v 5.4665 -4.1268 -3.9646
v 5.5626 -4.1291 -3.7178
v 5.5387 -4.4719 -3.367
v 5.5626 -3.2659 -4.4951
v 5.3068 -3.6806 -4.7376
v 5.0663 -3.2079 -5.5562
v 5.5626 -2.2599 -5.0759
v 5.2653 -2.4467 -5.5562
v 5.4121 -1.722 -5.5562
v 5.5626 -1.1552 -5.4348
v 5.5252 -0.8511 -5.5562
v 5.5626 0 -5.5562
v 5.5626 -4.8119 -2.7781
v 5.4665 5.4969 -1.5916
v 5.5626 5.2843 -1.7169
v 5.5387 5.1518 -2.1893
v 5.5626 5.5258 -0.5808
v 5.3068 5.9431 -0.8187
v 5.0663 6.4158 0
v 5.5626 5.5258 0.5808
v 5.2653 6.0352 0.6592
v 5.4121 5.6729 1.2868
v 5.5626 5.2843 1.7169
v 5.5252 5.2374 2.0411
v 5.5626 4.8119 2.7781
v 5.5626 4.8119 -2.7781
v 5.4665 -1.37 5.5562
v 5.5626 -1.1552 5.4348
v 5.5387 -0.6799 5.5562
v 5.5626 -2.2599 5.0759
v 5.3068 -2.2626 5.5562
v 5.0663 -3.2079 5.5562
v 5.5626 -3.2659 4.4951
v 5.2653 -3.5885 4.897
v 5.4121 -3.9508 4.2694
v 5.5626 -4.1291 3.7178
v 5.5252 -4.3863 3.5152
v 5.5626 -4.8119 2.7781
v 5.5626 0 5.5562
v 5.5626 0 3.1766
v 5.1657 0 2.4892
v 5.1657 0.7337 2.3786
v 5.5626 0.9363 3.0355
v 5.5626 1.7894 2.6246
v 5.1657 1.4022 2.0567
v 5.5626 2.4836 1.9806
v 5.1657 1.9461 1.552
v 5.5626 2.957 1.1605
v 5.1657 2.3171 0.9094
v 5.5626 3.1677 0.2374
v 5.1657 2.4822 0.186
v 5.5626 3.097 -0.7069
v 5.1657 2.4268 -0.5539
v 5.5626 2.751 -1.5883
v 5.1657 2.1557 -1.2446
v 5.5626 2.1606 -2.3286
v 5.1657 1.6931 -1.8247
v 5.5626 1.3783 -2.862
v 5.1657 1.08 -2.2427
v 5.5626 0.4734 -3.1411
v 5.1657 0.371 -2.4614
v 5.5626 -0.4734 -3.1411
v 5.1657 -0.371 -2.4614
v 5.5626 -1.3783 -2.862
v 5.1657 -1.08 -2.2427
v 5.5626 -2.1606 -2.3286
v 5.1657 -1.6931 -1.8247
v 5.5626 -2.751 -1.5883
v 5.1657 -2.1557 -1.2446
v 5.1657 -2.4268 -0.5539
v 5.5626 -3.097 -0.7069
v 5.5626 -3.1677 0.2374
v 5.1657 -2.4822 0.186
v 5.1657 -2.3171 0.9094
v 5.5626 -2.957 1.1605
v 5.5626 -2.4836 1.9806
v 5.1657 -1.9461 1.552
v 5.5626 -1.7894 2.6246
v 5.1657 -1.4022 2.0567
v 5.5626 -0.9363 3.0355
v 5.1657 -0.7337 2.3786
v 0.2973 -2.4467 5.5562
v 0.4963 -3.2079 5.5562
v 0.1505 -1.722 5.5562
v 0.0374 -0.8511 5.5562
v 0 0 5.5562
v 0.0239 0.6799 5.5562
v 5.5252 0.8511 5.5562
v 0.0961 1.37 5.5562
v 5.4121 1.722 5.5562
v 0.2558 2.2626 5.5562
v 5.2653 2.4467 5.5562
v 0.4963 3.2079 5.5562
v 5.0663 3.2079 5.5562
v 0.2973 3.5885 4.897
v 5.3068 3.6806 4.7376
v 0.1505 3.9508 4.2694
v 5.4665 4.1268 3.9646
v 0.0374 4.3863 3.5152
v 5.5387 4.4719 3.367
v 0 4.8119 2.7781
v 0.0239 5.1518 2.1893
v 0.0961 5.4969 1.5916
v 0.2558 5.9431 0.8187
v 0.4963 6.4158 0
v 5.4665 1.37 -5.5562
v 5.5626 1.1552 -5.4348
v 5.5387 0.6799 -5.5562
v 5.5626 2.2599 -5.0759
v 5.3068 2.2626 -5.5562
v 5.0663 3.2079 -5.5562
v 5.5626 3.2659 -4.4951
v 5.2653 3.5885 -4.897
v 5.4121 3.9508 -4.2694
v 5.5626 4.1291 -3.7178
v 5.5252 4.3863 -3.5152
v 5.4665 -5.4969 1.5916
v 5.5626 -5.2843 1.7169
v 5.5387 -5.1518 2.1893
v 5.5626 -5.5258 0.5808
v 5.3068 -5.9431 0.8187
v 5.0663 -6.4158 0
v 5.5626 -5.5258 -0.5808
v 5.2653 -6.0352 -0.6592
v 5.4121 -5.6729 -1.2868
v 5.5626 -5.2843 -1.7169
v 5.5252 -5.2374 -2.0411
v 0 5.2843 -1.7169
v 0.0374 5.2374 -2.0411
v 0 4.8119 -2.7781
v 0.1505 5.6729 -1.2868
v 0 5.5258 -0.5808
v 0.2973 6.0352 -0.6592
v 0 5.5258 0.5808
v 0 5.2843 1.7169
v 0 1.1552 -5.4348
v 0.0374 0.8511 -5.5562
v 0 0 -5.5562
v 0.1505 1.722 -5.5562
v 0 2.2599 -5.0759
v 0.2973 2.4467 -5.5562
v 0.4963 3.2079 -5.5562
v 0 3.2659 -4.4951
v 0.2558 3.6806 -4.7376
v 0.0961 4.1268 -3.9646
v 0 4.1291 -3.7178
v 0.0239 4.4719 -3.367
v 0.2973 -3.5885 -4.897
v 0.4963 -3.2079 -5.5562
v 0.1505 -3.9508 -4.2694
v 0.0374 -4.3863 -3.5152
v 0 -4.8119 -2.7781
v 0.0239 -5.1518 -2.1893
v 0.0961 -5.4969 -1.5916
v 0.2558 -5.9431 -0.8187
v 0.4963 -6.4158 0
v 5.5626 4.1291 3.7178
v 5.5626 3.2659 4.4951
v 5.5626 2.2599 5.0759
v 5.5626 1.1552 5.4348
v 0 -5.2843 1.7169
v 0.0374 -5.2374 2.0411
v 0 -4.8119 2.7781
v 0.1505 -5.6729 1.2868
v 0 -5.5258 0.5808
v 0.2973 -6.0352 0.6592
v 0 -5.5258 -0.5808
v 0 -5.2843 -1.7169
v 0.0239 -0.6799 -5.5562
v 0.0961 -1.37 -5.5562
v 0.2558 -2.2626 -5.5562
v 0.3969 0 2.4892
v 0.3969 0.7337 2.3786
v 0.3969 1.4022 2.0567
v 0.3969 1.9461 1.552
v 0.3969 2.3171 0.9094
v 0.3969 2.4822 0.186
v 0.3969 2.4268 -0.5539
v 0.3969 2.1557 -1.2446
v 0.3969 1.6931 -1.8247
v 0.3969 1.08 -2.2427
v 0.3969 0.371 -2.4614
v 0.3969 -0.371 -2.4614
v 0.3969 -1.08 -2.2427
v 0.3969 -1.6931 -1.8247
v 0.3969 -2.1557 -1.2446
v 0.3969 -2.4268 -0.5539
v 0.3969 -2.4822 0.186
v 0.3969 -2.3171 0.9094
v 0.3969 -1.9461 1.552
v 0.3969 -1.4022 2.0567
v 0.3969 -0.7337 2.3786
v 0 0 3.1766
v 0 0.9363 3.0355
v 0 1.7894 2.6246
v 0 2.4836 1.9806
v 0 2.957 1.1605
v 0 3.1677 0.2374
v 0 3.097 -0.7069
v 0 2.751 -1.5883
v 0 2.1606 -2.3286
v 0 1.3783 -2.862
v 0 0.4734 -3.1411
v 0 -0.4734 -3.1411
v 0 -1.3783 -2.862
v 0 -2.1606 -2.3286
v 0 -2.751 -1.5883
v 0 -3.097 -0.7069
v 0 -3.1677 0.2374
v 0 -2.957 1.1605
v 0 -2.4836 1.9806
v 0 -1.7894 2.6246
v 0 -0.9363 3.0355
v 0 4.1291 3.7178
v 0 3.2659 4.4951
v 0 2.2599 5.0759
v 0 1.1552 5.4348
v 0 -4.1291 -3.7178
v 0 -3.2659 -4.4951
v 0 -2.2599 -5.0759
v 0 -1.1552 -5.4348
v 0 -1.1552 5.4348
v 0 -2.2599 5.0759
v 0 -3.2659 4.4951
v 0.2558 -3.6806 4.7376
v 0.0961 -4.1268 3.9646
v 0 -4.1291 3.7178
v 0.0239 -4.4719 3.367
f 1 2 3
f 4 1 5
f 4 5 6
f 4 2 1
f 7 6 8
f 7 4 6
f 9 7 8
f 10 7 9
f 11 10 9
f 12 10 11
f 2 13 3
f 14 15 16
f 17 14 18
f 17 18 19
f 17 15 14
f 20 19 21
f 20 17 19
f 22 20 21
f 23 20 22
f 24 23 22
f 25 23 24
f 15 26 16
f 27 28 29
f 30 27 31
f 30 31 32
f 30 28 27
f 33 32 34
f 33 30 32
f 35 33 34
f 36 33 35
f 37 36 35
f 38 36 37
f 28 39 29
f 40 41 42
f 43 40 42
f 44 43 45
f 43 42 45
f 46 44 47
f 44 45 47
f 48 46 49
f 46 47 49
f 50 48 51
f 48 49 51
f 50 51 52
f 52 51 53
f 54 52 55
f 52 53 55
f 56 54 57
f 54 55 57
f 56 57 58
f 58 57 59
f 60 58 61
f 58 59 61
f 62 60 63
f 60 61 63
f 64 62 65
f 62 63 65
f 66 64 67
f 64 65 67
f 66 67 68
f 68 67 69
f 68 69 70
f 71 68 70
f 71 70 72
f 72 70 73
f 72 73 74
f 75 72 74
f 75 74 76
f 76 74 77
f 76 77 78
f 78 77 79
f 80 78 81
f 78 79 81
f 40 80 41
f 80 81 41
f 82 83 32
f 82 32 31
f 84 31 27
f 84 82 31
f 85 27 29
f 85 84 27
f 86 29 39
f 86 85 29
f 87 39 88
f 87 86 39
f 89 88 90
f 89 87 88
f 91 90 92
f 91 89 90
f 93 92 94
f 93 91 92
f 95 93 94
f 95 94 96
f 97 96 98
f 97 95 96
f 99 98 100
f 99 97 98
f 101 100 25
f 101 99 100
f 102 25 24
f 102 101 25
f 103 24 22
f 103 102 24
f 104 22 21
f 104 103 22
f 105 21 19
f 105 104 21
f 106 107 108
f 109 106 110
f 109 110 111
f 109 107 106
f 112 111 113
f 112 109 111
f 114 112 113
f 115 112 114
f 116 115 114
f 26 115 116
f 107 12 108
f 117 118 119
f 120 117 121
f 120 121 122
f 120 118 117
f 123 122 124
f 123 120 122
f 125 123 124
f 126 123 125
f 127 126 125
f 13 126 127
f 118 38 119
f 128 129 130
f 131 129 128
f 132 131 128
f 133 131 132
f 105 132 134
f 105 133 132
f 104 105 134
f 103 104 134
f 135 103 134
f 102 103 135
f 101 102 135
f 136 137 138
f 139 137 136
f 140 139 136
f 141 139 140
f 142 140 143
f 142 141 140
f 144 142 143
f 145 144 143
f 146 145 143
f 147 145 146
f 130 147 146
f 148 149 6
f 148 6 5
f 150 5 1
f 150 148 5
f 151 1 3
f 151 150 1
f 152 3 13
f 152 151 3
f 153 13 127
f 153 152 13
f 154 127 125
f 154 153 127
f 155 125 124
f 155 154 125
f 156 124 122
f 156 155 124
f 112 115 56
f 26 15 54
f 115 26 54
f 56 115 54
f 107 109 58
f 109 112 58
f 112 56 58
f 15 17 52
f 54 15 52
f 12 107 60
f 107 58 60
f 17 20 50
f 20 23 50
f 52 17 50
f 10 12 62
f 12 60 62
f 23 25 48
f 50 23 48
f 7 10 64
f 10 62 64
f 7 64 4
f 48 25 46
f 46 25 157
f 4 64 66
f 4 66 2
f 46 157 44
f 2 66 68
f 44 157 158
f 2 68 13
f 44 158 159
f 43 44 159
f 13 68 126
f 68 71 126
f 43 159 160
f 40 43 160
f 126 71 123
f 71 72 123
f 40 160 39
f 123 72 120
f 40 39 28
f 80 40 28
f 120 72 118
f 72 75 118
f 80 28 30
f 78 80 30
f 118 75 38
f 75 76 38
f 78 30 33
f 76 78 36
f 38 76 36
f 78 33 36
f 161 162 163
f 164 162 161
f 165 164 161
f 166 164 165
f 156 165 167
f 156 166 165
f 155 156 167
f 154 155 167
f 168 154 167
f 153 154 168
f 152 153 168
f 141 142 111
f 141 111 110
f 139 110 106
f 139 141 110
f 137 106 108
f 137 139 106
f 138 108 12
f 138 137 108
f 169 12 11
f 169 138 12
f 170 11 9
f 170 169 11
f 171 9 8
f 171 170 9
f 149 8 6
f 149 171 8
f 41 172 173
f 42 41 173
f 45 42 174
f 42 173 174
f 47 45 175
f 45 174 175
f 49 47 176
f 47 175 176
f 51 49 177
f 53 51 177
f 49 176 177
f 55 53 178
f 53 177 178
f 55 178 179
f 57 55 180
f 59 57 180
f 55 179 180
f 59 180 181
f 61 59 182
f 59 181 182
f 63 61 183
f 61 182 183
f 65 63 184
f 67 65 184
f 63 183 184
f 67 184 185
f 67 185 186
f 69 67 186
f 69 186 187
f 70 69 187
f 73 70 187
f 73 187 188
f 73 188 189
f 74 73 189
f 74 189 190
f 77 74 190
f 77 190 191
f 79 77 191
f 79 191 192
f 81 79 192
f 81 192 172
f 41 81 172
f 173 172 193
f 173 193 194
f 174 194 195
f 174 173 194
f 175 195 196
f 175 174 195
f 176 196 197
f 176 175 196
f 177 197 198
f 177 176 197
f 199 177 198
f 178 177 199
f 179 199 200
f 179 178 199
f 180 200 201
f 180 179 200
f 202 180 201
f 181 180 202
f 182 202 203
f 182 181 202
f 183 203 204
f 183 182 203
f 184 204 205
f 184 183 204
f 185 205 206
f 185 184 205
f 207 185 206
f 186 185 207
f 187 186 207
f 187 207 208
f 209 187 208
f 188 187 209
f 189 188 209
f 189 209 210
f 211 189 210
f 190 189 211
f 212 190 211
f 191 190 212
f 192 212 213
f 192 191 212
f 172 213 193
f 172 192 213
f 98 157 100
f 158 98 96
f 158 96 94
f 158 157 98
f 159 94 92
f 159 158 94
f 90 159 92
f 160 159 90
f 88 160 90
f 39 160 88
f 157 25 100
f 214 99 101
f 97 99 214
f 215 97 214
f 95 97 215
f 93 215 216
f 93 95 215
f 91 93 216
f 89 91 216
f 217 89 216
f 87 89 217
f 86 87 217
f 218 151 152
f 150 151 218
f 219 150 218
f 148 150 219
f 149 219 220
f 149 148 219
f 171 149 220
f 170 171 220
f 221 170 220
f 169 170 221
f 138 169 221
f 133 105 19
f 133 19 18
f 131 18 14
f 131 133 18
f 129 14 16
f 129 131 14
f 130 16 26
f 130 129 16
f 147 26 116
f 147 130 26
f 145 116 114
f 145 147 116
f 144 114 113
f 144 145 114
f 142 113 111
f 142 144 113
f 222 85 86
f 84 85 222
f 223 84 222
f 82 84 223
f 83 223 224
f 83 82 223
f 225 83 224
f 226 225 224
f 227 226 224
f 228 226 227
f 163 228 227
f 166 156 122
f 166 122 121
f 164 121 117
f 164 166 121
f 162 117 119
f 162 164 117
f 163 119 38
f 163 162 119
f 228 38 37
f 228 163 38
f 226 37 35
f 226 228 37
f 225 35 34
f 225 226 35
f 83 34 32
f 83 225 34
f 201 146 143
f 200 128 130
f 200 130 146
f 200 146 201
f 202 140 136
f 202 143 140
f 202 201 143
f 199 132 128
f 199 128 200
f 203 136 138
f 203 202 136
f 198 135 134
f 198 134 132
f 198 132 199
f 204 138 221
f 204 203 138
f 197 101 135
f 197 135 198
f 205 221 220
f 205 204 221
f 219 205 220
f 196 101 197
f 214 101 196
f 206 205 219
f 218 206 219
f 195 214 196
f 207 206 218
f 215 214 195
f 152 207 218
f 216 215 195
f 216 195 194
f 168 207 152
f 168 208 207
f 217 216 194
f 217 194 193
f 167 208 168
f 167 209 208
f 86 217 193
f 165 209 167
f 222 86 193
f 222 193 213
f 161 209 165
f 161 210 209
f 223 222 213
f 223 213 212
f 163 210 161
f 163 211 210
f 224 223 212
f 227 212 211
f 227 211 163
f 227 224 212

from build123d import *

# Parameters (mm, degrees)
BODY_DEPTH     = 5.5626
THREAD_D       = 4.9784
CHAMFER2_SIZE  = 0.687407664
CHAMFER2_SIZE2 = 0.396875
CHAMFER3_SIZE  = 0.687407664
CHAMFER3_SIZE2 = 0.396875


with BuildPart() as part:
    # Sketch1 → Body (new body)
    with BuildSketch(Plane.YZ):
        Polygon((-6.415804866, 0), (-3.207902433, 5.55625), (3.207902433, 5.55625), (6.415804866, 0), (3.207902433, -5.55625), (-3.207902433, -5.55625), align=None)
    extrude(amount=BODY_DEPTH)

    # Sketch2 → Chamfer1 (revolve, cut)
    with BuildSketch(Plane.XY):
        Polygon((0, 5.55625), (0.496264233, 6.415804866), (0, 6.415804866), align=None)
        Polygon((5.5626, 5.55625), (5.5626, 6.415804866), (5.066335767, 6.415804866), align=None)
    revolve(axis=Axis((-1.11252, 0, 0), (1, 0, 0)), mode=Mode.SUBTRACT)

    # Thread (through all)
    with Locations(Plane(origin=(5.5626, 0, 0), x_dir=(0, 0, -1), z_dir=(1, 0, 0))):
        with Locations((0, 0)):
            Hole(THREAD_D / 2)

    # Chamfer2
    chamfer2_edges = [part.edges().sort_by_distance(p)[0] for p in [
        (5.5626, 0, -2.4892),
    ]]
    chamfer2_side = [part.faces().sort_by_distance(p)[0] for p in [
        (5.5626, -5.399095518, -9.9e-08),
    ]]
    chamfer(chamfer2_edges, length=CHAMFER2_SIZE, length2=CHAMFER2_SIZE2, reference=chamfer2_side[0])

    # Chamfer3
    chamfer3_edges = [part.edges().sort_by_distance(p)[0] for p in [
        (0, 0, -2.4892),
    ]]
    chamfer3_side = [part.faces().sort_by_distance(p)[0] for p in [
        (0, -5.399095518, -9.9e-08),
    ]]
    chamfer(chamfer3_edges, length=CHAMFER3_SIZE, length2=CHAMFER3_SIZE2, reference=chamfer3_side[0])


solid = part.part
